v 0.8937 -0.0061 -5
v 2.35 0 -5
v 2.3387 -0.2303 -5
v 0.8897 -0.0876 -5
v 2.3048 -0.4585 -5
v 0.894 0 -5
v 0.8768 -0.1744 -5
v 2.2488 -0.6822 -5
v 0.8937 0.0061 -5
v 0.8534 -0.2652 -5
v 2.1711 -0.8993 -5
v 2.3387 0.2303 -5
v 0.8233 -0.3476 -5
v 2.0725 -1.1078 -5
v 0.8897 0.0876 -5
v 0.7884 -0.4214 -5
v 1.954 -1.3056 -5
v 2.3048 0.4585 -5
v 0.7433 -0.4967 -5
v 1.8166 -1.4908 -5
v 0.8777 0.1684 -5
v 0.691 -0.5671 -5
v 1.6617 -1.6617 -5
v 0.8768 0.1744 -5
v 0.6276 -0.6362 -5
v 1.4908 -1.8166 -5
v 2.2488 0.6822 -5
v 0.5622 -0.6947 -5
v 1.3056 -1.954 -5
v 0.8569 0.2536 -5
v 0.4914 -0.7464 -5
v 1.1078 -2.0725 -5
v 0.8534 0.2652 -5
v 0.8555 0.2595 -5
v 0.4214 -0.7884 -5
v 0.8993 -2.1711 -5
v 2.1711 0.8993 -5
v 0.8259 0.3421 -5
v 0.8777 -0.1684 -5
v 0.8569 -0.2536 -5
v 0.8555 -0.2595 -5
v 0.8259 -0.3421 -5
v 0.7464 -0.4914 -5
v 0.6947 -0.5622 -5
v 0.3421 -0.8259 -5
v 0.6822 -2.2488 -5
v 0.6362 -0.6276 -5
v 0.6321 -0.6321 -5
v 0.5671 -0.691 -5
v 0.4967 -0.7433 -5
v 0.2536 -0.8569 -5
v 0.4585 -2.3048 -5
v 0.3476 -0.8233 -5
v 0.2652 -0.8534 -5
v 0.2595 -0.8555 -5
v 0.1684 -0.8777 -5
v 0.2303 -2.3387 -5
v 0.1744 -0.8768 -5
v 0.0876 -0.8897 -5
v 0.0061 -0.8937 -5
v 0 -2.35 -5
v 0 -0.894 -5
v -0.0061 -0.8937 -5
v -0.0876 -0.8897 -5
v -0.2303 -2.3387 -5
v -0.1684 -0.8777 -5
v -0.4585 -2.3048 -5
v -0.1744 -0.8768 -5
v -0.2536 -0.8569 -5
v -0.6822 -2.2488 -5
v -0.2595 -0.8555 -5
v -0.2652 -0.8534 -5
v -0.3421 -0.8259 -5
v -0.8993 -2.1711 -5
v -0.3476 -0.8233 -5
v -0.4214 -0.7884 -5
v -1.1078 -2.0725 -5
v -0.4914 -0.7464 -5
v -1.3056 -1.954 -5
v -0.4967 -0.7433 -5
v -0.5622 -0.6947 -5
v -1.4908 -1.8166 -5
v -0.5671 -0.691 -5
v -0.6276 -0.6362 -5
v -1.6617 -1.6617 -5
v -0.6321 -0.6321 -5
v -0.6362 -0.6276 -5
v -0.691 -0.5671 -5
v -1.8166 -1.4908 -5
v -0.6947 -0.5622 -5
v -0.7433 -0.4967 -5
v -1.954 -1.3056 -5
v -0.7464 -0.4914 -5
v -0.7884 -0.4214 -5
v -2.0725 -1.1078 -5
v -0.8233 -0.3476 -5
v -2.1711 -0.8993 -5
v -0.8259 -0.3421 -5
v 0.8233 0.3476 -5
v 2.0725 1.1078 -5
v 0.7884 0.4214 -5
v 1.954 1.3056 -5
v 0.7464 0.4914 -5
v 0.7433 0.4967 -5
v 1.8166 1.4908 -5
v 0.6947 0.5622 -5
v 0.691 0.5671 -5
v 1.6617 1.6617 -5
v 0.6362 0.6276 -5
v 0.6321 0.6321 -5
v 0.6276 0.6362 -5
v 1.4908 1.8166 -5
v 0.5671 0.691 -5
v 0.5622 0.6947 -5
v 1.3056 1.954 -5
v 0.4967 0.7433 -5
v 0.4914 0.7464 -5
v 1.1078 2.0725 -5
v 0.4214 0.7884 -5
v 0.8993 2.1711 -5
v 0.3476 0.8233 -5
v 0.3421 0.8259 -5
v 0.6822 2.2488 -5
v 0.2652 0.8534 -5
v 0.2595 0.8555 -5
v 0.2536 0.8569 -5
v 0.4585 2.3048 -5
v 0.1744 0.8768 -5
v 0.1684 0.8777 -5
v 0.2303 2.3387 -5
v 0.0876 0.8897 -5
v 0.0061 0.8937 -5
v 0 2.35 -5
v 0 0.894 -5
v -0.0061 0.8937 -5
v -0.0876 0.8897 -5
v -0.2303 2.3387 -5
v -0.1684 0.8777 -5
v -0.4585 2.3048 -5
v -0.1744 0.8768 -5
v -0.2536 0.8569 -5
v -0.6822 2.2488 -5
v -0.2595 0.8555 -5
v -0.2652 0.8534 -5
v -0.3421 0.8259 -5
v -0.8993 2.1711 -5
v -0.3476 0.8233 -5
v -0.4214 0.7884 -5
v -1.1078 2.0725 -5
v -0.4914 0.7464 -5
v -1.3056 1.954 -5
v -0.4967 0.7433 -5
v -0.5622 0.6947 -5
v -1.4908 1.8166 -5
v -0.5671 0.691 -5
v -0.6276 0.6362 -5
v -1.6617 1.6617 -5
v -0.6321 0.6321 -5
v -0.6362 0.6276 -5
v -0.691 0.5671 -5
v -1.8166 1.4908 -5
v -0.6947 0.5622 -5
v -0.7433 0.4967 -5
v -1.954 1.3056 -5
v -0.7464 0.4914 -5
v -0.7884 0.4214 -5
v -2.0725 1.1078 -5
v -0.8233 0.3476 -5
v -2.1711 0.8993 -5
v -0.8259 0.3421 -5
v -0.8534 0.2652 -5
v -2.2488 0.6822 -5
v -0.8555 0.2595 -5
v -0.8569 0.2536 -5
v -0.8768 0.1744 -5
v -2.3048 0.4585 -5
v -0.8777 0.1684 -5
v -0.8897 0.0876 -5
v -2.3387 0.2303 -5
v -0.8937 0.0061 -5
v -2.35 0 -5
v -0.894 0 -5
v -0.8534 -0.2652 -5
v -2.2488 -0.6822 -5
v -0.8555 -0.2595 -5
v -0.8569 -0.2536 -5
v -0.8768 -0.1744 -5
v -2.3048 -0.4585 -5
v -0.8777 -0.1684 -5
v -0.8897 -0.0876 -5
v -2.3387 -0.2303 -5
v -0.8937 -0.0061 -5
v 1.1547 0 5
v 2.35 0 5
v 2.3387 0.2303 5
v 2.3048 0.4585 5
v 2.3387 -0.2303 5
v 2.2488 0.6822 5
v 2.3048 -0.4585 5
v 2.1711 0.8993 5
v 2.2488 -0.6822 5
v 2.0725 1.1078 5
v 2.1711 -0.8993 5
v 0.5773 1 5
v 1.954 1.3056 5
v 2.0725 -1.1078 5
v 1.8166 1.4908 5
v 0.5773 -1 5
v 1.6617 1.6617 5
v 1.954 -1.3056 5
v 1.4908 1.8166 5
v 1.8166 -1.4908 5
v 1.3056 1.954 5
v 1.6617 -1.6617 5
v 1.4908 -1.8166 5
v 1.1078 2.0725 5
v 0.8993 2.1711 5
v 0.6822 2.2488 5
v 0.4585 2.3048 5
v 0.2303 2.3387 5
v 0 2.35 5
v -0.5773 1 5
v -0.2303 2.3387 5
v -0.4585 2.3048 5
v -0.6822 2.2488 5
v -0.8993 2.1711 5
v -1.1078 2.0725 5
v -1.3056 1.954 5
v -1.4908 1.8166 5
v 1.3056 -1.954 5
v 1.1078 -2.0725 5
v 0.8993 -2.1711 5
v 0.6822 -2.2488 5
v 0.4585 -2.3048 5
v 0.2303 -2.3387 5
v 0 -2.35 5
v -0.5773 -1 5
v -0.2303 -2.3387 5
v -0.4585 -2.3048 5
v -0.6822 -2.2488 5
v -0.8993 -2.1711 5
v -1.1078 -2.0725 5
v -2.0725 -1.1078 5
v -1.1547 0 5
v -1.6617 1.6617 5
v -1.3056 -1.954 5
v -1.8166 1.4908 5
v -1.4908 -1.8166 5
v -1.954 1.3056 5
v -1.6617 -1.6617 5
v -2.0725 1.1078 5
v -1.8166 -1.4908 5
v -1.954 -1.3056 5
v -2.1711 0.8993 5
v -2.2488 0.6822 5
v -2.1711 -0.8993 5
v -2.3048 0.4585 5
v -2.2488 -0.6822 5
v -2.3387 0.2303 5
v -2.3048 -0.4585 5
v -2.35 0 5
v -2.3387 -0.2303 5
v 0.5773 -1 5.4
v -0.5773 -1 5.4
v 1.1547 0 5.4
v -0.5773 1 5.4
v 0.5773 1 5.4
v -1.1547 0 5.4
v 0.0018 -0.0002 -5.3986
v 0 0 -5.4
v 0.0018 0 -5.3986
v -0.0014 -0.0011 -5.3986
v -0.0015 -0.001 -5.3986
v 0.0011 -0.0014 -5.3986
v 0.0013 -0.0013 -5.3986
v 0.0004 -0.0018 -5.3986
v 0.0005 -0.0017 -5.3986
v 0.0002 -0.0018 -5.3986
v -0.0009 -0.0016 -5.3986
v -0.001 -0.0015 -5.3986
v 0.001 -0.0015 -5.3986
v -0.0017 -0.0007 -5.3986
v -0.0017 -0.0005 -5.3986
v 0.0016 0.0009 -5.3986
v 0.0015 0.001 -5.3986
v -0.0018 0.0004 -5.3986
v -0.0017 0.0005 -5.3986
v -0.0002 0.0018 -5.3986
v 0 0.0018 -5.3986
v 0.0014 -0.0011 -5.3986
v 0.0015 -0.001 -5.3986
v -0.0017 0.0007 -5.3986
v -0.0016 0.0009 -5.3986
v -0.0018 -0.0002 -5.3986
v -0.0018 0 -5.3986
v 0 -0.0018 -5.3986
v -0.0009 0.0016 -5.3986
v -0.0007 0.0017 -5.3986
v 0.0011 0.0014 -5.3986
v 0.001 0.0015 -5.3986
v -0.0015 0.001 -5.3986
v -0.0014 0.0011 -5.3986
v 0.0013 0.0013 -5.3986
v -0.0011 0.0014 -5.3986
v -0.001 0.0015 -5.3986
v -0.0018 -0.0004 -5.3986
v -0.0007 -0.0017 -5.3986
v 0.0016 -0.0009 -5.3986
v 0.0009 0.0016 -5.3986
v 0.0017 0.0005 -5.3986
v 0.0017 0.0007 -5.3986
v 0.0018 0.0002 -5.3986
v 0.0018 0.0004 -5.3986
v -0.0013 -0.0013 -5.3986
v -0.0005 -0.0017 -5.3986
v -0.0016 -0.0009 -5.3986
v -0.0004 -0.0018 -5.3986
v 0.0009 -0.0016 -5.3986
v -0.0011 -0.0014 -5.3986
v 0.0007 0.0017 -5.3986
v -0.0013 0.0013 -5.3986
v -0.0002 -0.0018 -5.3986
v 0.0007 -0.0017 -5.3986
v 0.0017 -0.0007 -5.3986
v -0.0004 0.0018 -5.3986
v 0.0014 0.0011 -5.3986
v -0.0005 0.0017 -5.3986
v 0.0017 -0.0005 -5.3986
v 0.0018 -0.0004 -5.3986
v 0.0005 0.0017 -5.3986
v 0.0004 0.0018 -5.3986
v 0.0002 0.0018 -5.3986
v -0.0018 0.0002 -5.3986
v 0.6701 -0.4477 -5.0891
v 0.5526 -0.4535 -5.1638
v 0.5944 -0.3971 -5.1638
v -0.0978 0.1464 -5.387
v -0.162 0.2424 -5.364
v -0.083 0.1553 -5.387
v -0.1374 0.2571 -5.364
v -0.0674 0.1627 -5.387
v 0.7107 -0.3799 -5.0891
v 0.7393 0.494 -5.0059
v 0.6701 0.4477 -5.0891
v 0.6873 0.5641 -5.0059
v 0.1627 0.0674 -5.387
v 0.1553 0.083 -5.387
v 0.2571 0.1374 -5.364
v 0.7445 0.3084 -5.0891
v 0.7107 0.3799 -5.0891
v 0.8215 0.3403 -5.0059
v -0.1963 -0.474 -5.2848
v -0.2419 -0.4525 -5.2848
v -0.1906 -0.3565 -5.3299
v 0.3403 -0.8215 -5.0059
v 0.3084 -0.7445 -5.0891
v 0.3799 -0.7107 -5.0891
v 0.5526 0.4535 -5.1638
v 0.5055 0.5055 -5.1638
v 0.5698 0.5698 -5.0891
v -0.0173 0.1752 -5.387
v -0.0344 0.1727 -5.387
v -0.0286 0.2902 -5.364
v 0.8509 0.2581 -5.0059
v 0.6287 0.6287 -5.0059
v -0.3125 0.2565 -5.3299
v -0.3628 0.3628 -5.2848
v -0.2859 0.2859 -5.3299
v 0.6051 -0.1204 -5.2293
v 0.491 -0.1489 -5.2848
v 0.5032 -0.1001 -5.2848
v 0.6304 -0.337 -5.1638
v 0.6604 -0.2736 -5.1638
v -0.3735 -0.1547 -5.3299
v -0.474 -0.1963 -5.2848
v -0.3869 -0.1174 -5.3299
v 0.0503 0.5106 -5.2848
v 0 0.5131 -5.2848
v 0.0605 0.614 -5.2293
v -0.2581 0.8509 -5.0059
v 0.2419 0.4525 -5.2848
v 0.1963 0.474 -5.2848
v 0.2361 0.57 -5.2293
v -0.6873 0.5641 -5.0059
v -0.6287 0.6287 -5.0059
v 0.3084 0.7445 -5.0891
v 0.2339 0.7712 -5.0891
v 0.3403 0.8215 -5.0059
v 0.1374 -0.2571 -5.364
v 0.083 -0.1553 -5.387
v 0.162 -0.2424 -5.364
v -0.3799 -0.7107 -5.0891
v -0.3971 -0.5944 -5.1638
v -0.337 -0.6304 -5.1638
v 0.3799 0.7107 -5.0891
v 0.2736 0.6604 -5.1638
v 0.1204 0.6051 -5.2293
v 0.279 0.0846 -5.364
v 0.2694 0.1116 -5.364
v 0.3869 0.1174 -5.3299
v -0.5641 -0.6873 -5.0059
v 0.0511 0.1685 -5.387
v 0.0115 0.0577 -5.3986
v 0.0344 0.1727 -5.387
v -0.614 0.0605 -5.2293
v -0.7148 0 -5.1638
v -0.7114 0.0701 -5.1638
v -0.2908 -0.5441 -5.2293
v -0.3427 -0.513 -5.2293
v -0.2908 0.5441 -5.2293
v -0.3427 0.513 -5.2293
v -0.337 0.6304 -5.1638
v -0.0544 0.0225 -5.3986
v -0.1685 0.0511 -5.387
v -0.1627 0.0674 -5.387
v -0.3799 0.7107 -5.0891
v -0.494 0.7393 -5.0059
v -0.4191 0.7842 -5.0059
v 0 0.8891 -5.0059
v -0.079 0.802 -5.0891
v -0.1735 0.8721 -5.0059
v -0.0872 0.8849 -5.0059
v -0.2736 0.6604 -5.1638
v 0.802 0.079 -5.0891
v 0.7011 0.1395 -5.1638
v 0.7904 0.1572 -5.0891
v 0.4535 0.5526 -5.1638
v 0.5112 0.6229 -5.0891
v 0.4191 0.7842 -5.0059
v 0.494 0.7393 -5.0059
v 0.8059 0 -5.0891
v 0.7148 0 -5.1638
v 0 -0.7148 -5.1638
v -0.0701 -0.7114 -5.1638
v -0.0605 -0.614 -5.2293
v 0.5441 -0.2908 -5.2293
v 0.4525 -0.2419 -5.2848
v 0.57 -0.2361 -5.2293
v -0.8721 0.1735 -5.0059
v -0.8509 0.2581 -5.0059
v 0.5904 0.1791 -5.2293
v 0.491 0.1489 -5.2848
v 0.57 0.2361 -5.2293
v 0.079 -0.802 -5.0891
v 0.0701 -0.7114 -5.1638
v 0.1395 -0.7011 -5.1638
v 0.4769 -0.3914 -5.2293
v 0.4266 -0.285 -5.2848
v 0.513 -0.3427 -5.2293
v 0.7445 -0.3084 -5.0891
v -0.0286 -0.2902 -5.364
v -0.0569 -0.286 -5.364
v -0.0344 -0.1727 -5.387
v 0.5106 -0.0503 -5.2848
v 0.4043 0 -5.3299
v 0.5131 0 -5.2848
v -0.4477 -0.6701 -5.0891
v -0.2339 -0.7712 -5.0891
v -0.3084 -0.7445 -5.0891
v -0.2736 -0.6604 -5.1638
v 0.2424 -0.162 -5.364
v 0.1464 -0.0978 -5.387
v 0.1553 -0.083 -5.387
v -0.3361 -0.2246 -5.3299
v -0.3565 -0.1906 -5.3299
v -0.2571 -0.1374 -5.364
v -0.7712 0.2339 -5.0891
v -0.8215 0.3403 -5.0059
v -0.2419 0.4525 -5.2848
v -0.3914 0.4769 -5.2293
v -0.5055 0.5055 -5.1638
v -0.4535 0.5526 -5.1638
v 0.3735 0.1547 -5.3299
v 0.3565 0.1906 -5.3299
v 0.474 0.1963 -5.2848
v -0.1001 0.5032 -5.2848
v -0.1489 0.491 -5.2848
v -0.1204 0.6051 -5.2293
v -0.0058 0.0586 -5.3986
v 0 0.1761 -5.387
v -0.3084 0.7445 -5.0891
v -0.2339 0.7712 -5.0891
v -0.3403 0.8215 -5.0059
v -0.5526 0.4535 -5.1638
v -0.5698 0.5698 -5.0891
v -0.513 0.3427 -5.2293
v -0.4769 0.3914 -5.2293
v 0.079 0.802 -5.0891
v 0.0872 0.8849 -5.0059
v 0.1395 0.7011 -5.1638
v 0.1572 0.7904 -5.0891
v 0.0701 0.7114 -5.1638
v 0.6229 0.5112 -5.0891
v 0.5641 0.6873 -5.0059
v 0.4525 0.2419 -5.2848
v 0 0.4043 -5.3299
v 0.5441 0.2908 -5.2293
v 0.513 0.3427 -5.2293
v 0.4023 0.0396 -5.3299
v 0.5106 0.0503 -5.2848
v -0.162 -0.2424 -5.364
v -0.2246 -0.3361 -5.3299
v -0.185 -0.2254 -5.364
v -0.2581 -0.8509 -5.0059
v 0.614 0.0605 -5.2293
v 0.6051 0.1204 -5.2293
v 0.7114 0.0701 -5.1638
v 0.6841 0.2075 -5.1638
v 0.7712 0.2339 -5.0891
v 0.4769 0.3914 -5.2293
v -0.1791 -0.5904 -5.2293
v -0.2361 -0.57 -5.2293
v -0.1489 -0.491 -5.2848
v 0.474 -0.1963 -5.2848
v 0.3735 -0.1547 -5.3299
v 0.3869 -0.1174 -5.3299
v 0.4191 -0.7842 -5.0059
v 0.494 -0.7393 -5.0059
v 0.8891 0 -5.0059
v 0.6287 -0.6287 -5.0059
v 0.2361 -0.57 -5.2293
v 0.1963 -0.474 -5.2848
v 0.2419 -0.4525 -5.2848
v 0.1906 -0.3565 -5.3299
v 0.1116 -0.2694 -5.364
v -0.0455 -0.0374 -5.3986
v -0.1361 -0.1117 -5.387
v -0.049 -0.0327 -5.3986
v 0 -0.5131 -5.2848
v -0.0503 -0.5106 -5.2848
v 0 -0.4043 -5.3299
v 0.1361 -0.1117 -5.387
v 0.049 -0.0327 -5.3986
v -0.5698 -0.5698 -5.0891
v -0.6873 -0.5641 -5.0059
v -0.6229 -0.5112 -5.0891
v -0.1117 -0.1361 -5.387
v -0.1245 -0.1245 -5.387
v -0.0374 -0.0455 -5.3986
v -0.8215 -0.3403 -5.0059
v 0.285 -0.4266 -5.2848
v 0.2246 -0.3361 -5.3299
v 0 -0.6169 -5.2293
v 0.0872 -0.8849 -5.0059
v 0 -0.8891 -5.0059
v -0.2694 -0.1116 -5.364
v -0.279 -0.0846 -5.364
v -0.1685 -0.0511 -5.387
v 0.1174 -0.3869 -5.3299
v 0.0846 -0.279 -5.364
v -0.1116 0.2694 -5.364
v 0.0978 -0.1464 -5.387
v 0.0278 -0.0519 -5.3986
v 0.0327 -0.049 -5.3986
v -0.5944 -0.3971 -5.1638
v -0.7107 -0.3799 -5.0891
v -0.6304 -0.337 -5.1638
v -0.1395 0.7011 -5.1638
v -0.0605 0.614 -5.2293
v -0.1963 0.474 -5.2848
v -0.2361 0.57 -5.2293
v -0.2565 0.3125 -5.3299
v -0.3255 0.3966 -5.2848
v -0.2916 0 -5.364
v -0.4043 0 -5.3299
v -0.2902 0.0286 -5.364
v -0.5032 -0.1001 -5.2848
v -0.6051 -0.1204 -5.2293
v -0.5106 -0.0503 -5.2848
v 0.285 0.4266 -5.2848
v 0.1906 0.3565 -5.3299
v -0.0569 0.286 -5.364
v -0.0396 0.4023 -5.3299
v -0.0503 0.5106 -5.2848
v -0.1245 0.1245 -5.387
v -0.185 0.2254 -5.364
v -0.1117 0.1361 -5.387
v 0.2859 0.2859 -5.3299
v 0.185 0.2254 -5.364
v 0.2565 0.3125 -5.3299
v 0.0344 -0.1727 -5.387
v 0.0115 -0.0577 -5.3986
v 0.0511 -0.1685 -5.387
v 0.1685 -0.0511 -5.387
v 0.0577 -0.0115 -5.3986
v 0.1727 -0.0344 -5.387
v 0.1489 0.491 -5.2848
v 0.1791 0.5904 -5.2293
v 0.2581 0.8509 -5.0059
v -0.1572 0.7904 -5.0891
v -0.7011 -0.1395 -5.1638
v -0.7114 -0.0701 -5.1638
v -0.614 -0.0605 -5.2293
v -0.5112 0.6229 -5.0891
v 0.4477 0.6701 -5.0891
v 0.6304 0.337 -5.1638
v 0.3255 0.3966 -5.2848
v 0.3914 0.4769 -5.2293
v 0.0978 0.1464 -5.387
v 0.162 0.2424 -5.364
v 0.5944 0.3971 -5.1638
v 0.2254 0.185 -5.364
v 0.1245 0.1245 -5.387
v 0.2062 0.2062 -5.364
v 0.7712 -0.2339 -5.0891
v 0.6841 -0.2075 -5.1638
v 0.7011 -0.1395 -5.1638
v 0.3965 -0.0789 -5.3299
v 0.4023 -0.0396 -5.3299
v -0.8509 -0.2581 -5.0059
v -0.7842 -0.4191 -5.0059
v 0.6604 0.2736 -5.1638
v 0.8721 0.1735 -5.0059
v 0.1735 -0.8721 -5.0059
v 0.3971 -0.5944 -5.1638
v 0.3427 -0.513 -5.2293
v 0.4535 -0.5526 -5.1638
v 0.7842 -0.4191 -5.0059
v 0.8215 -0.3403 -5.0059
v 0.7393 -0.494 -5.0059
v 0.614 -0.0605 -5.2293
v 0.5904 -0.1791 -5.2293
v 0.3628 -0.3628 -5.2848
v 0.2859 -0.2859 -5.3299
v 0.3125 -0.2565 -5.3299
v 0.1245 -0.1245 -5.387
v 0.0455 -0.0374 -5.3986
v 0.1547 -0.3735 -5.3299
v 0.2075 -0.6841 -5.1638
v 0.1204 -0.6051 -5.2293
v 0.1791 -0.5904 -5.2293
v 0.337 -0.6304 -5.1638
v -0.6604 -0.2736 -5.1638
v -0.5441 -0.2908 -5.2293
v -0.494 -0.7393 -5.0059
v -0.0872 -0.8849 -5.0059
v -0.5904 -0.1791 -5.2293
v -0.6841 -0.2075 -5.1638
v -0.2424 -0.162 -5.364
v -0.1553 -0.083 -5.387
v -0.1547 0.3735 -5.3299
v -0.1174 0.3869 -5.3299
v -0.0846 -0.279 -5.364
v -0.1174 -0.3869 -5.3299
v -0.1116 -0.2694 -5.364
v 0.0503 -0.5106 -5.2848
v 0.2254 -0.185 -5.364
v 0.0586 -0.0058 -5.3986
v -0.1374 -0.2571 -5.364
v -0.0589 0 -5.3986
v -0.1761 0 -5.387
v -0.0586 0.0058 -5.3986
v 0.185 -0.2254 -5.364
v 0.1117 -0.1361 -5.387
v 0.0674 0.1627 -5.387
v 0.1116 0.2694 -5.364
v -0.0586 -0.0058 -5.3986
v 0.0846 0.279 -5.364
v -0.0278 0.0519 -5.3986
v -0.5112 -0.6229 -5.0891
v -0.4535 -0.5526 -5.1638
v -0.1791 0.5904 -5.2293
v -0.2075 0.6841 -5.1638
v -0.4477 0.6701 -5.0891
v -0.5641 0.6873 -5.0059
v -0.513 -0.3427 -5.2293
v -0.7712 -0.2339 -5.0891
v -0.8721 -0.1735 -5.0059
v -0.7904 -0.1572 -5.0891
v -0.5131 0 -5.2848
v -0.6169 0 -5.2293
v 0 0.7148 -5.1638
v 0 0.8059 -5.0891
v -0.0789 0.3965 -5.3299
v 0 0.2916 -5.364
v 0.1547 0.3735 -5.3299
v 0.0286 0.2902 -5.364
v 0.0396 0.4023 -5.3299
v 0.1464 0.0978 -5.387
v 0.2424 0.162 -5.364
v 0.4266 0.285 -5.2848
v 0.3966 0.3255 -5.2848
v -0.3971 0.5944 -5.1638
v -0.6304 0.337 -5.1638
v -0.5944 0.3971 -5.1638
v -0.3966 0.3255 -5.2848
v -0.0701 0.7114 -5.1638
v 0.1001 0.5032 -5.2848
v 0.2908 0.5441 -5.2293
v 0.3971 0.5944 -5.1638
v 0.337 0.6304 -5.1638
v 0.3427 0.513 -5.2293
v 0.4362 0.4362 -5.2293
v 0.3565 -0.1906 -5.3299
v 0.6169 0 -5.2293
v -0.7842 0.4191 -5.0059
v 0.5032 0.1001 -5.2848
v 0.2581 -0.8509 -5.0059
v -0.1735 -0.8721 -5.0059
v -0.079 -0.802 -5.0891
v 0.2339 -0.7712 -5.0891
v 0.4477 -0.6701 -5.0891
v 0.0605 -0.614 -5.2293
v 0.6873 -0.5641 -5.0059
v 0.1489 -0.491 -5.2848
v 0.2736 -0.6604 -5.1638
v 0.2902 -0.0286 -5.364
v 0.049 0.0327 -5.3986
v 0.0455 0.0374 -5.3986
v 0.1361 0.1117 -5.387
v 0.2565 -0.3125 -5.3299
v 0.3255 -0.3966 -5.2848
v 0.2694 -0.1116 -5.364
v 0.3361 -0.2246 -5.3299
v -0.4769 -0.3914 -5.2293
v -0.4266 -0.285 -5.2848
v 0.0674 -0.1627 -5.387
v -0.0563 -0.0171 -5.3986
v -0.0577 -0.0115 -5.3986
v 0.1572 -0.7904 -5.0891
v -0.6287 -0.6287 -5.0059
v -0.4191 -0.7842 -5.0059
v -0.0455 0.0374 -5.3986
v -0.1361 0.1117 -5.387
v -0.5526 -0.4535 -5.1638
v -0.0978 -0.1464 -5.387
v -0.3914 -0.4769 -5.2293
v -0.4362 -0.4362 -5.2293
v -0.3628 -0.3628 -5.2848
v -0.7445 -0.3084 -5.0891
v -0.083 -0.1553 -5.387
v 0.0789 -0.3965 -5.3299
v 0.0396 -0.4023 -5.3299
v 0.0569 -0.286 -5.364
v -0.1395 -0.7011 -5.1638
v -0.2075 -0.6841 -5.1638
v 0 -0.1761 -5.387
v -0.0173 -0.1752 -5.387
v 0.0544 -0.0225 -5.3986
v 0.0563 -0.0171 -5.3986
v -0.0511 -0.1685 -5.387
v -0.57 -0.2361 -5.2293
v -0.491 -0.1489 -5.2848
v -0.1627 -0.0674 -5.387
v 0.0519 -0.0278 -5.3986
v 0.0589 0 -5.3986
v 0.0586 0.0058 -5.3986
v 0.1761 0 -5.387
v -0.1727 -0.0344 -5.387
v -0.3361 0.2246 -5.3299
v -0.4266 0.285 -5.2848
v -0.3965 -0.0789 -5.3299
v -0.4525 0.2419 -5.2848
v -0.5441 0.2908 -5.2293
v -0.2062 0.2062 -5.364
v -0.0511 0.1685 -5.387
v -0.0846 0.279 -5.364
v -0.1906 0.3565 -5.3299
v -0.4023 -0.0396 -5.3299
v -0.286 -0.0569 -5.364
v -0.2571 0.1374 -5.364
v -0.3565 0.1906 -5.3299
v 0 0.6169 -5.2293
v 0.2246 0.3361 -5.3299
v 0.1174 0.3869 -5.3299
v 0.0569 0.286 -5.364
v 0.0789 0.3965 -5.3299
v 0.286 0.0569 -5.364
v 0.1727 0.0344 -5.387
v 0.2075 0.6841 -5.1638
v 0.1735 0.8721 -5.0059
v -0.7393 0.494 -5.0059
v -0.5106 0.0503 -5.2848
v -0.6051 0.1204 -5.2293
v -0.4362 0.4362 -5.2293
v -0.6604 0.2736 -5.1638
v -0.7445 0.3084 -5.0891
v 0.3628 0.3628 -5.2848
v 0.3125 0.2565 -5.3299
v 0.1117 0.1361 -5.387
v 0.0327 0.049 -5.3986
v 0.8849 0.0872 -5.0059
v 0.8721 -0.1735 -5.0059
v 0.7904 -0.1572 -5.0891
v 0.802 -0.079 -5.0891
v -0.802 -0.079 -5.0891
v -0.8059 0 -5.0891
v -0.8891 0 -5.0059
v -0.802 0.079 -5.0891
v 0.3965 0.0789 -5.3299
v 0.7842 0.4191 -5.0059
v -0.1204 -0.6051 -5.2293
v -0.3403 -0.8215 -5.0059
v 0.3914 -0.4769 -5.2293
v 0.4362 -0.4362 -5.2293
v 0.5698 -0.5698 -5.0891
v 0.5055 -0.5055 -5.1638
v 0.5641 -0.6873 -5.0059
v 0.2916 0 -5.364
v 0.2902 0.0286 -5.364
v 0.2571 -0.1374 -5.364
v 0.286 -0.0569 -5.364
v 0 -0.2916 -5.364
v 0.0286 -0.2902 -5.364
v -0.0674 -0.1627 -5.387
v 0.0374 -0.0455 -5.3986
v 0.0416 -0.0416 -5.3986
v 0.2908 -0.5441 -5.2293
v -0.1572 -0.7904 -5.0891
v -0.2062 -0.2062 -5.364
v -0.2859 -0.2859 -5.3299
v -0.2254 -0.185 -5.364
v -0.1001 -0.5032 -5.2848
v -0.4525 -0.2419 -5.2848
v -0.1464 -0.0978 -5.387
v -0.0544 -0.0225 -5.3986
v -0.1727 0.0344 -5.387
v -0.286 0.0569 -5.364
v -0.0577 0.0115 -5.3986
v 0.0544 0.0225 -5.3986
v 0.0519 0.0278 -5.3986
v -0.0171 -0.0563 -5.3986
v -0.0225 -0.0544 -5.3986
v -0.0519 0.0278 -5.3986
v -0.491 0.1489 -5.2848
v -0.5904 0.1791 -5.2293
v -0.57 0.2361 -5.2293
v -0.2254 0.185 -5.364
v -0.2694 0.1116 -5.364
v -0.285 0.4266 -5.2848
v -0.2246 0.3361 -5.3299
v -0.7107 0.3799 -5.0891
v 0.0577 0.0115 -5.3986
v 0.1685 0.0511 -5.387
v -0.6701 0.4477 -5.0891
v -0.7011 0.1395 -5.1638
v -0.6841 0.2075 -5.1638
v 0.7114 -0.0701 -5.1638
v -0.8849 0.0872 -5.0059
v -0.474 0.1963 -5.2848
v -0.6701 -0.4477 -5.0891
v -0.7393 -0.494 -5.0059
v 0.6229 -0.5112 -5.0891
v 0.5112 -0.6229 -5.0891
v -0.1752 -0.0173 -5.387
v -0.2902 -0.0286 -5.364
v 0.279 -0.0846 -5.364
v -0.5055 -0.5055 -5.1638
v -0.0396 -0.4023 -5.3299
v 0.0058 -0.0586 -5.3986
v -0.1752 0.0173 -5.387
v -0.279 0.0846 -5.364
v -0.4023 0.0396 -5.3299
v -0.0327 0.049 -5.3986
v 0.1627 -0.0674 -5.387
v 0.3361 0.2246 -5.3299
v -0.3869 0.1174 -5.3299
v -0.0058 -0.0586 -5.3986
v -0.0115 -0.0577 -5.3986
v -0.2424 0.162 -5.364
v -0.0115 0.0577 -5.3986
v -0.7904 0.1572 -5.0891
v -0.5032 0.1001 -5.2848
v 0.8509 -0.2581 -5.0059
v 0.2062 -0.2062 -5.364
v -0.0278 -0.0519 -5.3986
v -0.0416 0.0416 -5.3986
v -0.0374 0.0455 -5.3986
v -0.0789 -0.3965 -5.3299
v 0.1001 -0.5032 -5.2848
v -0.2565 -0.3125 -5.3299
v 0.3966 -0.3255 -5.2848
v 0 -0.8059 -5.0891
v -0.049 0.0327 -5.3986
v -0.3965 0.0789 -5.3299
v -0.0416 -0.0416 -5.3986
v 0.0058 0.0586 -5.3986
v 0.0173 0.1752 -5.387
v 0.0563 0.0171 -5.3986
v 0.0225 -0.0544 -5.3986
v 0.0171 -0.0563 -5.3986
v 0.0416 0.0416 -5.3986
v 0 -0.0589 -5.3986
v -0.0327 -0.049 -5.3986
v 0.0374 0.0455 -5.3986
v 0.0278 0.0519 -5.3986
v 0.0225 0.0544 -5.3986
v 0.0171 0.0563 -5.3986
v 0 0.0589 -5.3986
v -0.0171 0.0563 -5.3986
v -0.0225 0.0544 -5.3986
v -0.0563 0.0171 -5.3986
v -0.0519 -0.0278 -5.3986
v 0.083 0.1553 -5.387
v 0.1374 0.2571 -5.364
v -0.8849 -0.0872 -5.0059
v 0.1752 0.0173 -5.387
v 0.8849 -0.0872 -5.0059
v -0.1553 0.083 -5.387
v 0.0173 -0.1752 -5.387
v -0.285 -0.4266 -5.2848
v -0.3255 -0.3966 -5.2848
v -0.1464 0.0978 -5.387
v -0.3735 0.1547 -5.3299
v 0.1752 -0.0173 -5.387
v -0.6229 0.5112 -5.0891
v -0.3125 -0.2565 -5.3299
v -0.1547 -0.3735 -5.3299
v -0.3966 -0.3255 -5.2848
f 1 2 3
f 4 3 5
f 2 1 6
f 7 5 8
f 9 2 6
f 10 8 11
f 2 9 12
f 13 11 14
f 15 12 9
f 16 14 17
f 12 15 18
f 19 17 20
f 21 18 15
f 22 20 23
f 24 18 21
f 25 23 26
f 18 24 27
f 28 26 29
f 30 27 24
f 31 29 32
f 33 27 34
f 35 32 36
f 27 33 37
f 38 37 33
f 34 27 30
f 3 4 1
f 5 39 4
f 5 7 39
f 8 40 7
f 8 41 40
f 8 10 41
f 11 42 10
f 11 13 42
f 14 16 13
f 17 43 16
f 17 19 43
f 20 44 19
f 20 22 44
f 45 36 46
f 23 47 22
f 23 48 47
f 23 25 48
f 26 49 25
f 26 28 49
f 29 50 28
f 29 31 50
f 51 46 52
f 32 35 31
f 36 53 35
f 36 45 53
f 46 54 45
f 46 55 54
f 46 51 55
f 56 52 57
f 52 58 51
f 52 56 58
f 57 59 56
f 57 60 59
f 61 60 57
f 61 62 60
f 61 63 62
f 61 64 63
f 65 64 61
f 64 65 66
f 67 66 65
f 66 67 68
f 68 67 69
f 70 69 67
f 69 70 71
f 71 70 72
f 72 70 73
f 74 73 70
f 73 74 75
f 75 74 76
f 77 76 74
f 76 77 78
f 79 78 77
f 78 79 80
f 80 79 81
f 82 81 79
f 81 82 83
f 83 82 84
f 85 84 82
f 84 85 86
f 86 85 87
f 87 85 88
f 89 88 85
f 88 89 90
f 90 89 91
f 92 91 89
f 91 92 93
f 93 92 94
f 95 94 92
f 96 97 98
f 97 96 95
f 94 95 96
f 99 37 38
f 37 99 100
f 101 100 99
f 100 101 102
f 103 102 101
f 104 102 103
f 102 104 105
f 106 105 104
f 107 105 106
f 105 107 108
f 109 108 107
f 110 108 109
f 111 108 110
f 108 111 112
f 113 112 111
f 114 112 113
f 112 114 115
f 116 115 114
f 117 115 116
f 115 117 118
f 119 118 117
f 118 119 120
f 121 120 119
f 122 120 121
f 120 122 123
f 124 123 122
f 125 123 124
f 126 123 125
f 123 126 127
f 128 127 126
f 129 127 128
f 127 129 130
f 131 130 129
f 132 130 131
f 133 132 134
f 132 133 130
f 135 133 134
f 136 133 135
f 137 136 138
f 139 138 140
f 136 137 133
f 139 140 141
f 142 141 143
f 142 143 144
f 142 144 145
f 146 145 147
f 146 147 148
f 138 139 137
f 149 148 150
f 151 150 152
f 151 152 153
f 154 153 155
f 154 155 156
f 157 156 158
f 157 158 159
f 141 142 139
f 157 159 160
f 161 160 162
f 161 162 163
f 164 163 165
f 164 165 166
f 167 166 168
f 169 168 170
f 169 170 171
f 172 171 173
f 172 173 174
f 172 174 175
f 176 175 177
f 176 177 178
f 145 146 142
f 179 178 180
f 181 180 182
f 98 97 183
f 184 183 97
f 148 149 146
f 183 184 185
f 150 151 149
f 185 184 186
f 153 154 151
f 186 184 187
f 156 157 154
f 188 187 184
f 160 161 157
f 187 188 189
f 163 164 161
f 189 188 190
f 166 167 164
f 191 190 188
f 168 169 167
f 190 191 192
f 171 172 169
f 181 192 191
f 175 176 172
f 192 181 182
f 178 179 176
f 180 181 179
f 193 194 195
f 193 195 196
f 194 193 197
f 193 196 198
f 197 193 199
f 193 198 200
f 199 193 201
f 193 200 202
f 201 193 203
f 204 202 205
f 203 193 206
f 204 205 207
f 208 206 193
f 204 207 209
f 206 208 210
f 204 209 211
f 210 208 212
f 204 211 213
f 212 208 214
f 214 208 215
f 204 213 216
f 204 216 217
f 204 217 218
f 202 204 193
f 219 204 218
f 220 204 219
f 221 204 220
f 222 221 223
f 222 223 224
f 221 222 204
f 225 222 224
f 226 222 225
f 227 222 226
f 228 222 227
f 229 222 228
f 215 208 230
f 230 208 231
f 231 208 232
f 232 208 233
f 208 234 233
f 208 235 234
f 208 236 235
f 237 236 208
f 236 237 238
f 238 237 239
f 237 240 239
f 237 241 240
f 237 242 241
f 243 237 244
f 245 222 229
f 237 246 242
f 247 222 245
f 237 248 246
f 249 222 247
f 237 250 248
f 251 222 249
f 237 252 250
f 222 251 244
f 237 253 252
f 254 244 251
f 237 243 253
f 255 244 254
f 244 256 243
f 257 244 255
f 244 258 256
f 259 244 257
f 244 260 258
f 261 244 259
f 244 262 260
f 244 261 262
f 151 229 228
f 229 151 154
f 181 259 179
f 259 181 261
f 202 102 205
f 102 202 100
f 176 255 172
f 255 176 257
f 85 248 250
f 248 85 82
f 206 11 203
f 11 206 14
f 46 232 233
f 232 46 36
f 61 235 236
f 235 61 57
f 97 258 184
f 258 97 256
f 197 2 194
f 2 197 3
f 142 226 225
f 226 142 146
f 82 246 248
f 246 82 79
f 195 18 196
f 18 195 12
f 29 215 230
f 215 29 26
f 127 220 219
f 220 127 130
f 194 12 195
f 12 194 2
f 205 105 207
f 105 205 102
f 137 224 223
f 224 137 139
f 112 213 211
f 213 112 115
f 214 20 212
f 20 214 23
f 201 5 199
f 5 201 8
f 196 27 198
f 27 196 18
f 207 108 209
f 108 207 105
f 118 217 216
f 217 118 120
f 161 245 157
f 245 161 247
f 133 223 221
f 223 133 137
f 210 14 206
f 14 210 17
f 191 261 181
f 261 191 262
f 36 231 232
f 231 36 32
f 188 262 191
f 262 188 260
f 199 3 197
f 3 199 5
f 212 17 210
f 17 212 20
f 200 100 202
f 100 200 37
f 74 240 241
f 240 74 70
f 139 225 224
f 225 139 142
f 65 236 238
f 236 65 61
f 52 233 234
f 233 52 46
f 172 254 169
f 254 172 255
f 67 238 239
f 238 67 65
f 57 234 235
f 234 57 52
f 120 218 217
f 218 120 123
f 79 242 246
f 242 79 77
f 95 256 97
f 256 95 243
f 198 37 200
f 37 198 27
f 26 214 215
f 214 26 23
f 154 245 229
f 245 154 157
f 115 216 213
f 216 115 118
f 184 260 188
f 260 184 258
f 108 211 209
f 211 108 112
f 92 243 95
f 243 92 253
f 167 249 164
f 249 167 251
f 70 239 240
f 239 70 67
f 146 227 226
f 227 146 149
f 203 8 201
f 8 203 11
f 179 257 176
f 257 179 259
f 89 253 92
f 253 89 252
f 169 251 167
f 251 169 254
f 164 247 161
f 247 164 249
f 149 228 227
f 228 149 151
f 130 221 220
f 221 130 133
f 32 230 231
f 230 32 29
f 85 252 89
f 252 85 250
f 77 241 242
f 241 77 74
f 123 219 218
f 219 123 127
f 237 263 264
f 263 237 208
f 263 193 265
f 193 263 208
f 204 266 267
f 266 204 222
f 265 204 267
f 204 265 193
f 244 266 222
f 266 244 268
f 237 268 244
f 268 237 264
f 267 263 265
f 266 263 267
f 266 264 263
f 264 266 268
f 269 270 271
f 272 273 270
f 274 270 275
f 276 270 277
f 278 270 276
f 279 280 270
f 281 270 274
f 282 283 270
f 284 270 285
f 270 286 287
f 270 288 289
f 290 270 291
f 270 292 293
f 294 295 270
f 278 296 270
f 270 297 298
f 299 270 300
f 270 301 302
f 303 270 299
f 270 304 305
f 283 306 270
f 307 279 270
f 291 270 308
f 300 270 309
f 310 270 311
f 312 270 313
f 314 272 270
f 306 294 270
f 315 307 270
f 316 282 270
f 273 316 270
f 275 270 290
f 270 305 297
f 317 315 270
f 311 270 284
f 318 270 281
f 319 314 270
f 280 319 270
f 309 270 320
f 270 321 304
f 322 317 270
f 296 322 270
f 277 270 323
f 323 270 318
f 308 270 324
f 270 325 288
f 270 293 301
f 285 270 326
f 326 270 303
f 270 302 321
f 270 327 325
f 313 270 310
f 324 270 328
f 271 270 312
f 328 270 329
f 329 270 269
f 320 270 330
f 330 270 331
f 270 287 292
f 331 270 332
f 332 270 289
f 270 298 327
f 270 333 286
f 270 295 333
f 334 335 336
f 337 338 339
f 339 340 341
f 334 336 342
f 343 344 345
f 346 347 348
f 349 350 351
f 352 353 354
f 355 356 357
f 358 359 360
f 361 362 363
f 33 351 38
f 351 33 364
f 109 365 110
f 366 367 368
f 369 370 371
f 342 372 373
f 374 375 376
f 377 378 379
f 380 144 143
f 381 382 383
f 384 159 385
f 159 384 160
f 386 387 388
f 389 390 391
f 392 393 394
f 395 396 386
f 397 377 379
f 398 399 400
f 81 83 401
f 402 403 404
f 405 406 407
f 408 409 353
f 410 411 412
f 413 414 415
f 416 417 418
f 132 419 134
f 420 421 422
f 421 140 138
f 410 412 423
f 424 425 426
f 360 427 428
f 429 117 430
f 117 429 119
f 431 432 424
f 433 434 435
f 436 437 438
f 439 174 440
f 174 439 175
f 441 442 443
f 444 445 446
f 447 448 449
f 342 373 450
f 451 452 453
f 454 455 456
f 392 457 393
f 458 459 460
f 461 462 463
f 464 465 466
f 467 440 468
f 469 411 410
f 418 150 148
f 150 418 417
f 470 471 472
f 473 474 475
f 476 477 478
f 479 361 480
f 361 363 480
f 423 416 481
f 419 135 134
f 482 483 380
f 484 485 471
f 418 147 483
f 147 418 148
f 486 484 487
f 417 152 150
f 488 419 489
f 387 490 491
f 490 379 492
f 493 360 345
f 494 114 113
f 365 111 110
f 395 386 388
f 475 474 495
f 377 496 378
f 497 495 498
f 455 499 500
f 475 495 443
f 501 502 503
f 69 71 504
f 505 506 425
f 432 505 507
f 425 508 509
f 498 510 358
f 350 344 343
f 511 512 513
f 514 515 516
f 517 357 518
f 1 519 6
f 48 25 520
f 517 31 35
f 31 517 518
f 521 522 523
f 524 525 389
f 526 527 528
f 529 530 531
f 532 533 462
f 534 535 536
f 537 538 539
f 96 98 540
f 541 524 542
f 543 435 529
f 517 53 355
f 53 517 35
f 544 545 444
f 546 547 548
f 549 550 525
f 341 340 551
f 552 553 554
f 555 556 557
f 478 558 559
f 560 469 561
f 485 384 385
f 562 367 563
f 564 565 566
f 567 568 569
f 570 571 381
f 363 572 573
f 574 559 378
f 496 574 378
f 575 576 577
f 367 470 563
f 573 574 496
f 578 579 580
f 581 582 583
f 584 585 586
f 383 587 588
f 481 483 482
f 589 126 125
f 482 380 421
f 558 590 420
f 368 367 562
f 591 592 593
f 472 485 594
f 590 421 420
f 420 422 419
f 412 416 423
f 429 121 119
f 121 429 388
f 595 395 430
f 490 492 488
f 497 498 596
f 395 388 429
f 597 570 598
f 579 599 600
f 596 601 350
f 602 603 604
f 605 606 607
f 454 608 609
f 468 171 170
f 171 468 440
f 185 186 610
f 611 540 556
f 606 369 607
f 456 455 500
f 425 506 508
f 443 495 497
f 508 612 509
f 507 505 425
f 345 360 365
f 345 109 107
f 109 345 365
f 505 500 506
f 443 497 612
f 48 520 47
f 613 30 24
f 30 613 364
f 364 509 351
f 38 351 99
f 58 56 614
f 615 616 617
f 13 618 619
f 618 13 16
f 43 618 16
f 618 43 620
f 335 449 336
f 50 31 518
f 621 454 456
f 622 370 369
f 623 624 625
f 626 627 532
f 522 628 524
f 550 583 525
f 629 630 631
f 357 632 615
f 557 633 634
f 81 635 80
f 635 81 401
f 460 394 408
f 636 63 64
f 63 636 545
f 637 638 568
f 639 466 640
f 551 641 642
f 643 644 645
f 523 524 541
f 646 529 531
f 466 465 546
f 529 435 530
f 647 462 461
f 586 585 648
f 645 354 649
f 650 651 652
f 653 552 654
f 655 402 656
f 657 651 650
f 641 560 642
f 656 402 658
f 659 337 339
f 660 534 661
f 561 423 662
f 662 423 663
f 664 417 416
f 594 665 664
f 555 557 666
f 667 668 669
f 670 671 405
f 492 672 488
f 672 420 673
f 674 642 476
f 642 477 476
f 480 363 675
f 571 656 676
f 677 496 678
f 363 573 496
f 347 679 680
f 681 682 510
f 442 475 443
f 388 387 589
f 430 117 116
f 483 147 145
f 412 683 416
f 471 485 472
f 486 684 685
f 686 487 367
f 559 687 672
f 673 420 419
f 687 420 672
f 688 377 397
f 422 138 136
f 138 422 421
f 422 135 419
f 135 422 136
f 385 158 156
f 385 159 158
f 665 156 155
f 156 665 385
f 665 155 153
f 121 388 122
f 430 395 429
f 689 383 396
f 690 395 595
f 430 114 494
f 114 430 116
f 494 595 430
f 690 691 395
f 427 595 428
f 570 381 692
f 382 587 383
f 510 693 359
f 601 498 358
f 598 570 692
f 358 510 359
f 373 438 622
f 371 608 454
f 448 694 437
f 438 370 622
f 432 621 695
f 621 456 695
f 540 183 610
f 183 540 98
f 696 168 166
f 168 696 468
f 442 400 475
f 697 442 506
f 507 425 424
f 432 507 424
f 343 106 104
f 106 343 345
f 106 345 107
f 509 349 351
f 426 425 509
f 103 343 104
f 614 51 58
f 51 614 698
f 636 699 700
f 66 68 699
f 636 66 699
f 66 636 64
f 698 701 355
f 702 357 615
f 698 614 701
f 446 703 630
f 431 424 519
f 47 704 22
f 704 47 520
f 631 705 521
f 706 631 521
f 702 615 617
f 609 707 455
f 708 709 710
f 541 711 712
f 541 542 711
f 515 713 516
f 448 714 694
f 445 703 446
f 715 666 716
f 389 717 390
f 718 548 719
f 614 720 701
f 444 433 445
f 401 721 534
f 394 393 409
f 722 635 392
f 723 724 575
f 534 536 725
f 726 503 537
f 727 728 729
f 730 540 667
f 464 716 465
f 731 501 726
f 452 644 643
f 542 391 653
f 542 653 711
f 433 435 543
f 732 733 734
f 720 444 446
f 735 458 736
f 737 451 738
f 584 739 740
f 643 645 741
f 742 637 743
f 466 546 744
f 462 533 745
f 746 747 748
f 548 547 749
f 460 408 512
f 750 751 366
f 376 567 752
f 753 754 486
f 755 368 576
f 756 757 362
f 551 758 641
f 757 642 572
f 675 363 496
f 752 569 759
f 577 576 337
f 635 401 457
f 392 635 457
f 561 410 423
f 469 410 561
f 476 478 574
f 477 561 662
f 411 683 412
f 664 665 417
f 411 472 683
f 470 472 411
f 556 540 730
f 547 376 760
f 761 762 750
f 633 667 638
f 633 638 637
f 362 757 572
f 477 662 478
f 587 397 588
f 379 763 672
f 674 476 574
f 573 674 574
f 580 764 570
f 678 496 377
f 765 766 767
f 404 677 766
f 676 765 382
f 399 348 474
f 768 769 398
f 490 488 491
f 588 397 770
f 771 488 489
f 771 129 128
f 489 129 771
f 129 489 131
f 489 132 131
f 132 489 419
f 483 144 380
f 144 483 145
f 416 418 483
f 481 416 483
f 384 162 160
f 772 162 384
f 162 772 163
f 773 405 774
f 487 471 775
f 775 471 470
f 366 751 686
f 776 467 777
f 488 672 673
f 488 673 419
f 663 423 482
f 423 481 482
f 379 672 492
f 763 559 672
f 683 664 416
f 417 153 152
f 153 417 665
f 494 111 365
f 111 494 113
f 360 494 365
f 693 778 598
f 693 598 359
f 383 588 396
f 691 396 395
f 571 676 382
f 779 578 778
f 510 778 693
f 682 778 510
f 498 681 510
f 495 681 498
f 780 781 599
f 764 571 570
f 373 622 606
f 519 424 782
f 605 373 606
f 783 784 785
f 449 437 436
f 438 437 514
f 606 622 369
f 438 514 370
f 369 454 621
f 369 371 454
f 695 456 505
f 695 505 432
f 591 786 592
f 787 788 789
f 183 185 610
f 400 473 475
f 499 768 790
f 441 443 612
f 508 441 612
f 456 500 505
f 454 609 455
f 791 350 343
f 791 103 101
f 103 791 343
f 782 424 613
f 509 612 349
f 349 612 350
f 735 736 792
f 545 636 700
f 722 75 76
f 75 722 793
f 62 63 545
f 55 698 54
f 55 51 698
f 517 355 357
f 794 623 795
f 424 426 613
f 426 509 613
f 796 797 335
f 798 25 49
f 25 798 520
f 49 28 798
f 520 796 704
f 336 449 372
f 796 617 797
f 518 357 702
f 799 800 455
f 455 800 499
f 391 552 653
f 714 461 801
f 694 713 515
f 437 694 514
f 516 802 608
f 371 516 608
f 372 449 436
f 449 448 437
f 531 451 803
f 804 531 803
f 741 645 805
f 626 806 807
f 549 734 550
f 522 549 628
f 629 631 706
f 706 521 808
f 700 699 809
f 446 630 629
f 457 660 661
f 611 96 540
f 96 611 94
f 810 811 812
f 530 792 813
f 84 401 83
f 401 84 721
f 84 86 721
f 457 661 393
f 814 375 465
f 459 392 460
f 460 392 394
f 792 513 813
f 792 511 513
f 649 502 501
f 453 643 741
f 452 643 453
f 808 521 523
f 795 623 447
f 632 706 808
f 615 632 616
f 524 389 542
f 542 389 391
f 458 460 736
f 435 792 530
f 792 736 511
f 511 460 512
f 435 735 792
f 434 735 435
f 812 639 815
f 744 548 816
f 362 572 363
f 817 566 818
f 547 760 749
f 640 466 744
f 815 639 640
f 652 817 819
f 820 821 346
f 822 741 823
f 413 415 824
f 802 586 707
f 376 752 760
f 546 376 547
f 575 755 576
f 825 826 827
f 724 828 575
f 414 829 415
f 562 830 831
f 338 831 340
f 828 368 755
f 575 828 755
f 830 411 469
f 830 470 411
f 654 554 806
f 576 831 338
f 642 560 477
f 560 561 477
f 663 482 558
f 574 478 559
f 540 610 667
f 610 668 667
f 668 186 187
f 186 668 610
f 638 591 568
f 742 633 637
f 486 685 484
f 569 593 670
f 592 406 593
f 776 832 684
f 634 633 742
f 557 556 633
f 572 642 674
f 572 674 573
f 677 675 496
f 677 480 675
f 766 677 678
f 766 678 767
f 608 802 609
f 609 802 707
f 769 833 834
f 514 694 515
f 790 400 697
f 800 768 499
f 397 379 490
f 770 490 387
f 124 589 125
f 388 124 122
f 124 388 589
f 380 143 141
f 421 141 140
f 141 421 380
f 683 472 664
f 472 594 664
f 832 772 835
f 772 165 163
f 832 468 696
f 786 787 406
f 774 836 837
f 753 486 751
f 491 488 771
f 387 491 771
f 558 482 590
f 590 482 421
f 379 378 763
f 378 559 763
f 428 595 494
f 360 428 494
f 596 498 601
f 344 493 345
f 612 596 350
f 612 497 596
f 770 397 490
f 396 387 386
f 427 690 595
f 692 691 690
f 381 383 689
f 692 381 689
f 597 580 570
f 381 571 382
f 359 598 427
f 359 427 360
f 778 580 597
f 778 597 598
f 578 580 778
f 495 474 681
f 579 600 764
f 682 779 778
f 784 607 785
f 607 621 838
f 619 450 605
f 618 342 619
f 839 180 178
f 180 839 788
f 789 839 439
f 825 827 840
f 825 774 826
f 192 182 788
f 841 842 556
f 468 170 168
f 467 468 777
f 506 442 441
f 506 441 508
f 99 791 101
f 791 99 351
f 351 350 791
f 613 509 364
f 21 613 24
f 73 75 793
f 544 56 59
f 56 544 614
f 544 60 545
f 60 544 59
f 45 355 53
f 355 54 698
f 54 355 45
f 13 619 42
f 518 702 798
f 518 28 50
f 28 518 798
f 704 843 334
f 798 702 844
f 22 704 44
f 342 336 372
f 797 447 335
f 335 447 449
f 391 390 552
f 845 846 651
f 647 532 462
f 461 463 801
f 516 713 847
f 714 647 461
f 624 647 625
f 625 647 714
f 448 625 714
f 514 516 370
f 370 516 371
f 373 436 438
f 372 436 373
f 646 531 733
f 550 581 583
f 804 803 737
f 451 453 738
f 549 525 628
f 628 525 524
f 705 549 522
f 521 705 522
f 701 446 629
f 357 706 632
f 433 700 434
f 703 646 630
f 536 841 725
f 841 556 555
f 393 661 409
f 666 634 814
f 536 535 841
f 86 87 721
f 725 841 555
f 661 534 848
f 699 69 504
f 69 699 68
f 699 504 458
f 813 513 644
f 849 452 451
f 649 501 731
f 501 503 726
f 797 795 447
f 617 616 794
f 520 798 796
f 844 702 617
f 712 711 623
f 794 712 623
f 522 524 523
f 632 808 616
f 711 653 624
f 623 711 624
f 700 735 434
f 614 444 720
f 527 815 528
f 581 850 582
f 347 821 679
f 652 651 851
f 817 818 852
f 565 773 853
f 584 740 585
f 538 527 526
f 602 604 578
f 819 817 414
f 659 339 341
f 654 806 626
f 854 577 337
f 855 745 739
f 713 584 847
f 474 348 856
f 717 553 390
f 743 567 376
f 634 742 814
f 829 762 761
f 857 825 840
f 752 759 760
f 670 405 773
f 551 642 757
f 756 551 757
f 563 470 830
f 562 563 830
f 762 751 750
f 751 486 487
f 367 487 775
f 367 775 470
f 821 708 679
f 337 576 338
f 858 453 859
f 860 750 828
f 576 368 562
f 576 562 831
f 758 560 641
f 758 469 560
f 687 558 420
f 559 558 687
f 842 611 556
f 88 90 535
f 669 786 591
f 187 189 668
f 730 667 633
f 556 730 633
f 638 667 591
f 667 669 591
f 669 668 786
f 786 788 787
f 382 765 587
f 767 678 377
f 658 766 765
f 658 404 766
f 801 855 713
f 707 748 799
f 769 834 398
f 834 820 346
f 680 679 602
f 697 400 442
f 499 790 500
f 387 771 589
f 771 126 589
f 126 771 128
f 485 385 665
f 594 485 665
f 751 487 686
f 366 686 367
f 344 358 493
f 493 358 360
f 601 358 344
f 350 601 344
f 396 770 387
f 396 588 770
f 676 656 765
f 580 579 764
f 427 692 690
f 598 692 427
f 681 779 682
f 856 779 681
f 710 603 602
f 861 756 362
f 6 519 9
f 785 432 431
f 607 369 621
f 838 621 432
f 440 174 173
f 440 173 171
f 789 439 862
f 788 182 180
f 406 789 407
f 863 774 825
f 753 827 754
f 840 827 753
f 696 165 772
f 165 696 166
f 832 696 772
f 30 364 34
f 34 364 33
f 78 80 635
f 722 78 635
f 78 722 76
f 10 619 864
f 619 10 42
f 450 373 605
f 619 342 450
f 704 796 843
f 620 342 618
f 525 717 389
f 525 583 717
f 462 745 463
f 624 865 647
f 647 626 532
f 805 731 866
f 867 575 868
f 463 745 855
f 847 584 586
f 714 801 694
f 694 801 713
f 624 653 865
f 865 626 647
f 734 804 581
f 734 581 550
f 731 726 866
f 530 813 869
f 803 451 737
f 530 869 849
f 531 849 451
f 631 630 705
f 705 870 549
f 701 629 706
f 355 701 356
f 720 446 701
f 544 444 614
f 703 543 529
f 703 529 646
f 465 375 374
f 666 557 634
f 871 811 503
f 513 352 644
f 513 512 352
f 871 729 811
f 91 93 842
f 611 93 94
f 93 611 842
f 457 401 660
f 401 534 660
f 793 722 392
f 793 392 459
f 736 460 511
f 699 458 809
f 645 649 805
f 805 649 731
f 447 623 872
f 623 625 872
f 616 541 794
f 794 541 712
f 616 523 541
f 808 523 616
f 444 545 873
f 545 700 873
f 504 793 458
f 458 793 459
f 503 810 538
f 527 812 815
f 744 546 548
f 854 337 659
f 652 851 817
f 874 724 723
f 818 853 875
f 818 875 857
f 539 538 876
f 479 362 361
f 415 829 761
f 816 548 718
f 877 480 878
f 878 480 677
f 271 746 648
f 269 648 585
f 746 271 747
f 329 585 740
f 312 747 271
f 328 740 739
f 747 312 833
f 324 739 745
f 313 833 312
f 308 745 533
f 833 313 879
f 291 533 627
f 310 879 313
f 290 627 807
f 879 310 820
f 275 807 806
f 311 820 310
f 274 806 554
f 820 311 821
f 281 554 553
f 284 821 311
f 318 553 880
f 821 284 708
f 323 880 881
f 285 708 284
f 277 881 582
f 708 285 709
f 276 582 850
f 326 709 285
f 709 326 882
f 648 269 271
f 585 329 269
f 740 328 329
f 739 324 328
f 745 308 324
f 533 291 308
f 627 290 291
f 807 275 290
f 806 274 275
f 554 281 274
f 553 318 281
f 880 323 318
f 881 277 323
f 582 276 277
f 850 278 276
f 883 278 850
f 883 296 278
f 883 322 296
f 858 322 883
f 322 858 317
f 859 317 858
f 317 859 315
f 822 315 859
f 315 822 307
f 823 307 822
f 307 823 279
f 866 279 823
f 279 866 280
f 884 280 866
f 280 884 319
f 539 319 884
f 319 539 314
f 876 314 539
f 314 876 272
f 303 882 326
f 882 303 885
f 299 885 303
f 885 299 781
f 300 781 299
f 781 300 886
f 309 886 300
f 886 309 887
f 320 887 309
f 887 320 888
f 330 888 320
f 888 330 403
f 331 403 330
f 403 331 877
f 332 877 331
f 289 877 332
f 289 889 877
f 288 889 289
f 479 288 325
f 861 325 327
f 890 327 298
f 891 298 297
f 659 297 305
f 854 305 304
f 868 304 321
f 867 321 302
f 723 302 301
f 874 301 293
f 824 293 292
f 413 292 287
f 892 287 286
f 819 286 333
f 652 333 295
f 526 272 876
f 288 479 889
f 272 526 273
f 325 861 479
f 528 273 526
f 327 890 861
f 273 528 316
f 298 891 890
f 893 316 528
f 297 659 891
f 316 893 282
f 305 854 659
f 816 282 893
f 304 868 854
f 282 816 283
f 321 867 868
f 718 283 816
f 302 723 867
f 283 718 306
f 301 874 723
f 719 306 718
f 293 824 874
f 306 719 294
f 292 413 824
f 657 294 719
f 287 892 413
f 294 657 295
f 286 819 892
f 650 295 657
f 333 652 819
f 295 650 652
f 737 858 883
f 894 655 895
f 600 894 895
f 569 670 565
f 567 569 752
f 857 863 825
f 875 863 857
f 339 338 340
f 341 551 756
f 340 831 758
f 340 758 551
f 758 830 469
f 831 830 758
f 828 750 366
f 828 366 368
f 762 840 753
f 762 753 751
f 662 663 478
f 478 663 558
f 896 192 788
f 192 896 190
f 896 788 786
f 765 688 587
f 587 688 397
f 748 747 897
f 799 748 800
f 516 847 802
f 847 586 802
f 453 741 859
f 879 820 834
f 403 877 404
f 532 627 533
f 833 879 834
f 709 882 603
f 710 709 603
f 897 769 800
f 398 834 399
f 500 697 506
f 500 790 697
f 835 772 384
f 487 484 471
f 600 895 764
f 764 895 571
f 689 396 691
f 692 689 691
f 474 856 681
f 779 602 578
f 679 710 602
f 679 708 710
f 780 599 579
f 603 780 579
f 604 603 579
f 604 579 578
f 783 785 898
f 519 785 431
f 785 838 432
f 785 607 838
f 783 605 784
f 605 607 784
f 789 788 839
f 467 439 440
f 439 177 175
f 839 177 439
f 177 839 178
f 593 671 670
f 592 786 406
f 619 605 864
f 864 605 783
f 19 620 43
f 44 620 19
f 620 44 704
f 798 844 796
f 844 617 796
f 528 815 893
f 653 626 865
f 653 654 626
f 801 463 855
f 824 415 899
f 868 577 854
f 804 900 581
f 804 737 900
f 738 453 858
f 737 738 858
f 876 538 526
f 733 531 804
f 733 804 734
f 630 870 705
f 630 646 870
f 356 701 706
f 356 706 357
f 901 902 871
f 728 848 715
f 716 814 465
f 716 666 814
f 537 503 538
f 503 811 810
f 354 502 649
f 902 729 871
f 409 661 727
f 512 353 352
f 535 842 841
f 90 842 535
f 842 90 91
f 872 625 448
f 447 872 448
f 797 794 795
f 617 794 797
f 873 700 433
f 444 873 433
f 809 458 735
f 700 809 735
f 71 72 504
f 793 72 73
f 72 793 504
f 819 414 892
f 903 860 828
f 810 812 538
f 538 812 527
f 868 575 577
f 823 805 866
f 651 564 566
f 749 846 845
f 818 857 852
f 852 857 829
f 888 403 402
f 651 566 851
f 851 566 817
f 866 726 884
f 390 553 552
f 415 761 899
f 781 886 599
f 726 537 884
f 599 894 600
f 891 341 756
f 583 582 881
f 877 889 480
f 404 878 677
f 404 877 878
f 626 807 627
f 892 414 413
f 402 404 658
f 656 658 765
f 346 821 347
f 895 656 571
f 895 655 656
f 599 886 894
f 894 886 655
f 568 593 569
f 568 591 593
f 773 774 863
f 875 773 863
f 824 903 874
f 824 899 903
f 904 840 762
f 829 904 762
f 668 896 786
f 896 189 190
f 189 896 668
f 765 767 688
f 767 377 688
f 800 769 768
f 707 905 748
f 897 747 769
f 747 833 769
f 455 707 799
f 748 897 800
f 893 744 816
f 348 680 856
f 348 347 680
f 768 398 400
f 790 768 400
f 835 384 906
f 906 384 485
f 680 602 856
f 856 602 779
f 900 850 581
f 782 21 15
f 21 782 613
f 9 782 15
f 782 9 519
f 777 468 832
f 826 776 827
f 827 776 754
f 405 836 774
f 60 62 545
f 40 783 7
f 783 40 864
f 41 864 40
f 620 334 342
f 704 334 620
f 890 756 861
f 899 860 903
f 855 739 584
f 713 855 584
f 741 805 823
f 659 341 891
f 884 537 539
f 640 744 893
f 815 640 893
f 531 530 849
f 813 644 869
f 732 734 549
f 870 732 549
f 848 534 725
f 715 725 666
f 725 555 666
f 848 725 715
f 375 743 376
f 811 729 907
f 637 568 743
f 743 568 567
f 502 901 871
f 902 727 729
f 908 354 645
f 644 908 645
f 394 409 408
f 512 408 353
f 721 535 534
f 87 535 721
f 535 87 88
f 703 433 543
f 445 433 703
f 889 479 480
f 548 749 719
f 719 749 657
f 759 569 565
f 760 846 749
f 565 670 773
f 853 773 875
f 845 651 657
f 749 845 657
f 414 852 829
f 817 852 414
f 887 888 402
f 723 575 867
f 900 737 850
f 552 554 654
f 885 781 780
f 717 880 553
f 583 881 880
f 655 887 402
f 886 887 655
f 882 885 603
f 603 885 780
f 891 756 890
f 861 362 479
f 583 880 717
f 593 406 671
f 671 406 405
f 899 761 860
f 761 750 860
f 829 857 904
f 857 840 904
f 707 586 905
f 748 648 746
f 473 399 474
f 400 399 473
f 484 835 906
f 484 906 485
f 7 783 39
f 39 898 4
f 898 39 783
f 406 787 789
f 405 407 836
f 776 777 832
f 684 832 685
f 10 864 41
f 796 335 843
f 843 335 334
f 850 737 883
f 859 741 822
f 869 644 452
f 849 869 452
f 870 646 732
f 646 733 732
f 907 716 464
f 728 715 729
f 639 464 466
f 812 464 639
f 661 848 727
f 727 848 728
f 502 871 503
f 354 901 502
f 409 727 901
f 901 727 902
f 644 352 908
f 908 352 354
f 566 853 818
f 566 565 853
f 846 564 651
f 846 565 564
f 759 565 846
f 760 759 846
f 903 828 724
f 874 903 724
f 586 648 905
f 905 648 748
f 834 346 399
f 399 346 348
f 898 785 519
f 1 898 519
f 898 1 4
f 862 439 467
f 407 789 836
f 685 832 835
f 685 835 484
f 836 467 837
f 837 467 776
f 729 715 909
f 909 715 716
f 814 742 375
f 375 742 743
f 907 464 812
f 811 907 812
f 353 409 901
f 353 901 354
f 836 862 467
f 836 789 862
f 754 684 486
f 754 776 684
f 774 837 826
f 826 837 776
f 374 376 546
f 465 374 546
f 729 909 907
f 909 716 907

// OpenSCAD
// Parameters
length_mm = 10; //[5:20:1]
major_diameter_mm = 4; //[3:6:0.1]
pitch_mm = 0.7; //[0.5:1:0.05]
thread_depth_mm = 0.35; //[0.2:0.6:0.05]
hex_af_mm = 2; //[1.5:3:0.1]
socket_depth_mm = 2; //[1:4:0.1]
tip_cone_height_mm = 0.8; //[0.3:2:0.1]
cup_point_depth_mm = 0.4; //[0:1.2:0.1]
cup_point_radius_mm = 1.2; //[0.6:2:0.1]
overlap_mm = 0.8; //[0.5:2:0.1]

// Screw - complete geometry
module screw() {
  color("DimGray") {
    // Grub screw body
    cylinder(r=major_diameter_mm/2, h=length_mm, center=true, $fn=64);
    
    // Male thread (approximation)
    translate([0, 0, -length_mm/2])
      cylinder(r=major_diameter_mm/2 + thread_depth_mm, h=length_mm, center=false, $fn=64);
    
    // Hex socket drive
    difference() {
      translate([0, 0, length_mm/2 - socket_depth_mm/2])
        cylinder(r=hex_af_mm/(2*cos(30)), h=socket_depth_mm + overlap_mm, center=true, $fn=6);
    }
    
    // Tip end cone
    translate([0, 0, -length_mm/2 + tip_cone_height_mm/2])
      rotate([180, 0, 0])
      cylinder(r1=major_diameter_mm/2, r2=0, h=tip_cone_height_mm + overlap_mm, center=true, $fn=64);
    
    // Cup point cut
    if (cup_point_depth_mm > 0) {
      translate([0, 0, -length_mm/2 + cup_point_radius_mm - cup_point_depth_mm])
        sphere(r=cup_point_radius_mm, center=true, $fn=64);
    }
  }
}

// Assembly
module assembly() {
  screw();
}

assembly();
